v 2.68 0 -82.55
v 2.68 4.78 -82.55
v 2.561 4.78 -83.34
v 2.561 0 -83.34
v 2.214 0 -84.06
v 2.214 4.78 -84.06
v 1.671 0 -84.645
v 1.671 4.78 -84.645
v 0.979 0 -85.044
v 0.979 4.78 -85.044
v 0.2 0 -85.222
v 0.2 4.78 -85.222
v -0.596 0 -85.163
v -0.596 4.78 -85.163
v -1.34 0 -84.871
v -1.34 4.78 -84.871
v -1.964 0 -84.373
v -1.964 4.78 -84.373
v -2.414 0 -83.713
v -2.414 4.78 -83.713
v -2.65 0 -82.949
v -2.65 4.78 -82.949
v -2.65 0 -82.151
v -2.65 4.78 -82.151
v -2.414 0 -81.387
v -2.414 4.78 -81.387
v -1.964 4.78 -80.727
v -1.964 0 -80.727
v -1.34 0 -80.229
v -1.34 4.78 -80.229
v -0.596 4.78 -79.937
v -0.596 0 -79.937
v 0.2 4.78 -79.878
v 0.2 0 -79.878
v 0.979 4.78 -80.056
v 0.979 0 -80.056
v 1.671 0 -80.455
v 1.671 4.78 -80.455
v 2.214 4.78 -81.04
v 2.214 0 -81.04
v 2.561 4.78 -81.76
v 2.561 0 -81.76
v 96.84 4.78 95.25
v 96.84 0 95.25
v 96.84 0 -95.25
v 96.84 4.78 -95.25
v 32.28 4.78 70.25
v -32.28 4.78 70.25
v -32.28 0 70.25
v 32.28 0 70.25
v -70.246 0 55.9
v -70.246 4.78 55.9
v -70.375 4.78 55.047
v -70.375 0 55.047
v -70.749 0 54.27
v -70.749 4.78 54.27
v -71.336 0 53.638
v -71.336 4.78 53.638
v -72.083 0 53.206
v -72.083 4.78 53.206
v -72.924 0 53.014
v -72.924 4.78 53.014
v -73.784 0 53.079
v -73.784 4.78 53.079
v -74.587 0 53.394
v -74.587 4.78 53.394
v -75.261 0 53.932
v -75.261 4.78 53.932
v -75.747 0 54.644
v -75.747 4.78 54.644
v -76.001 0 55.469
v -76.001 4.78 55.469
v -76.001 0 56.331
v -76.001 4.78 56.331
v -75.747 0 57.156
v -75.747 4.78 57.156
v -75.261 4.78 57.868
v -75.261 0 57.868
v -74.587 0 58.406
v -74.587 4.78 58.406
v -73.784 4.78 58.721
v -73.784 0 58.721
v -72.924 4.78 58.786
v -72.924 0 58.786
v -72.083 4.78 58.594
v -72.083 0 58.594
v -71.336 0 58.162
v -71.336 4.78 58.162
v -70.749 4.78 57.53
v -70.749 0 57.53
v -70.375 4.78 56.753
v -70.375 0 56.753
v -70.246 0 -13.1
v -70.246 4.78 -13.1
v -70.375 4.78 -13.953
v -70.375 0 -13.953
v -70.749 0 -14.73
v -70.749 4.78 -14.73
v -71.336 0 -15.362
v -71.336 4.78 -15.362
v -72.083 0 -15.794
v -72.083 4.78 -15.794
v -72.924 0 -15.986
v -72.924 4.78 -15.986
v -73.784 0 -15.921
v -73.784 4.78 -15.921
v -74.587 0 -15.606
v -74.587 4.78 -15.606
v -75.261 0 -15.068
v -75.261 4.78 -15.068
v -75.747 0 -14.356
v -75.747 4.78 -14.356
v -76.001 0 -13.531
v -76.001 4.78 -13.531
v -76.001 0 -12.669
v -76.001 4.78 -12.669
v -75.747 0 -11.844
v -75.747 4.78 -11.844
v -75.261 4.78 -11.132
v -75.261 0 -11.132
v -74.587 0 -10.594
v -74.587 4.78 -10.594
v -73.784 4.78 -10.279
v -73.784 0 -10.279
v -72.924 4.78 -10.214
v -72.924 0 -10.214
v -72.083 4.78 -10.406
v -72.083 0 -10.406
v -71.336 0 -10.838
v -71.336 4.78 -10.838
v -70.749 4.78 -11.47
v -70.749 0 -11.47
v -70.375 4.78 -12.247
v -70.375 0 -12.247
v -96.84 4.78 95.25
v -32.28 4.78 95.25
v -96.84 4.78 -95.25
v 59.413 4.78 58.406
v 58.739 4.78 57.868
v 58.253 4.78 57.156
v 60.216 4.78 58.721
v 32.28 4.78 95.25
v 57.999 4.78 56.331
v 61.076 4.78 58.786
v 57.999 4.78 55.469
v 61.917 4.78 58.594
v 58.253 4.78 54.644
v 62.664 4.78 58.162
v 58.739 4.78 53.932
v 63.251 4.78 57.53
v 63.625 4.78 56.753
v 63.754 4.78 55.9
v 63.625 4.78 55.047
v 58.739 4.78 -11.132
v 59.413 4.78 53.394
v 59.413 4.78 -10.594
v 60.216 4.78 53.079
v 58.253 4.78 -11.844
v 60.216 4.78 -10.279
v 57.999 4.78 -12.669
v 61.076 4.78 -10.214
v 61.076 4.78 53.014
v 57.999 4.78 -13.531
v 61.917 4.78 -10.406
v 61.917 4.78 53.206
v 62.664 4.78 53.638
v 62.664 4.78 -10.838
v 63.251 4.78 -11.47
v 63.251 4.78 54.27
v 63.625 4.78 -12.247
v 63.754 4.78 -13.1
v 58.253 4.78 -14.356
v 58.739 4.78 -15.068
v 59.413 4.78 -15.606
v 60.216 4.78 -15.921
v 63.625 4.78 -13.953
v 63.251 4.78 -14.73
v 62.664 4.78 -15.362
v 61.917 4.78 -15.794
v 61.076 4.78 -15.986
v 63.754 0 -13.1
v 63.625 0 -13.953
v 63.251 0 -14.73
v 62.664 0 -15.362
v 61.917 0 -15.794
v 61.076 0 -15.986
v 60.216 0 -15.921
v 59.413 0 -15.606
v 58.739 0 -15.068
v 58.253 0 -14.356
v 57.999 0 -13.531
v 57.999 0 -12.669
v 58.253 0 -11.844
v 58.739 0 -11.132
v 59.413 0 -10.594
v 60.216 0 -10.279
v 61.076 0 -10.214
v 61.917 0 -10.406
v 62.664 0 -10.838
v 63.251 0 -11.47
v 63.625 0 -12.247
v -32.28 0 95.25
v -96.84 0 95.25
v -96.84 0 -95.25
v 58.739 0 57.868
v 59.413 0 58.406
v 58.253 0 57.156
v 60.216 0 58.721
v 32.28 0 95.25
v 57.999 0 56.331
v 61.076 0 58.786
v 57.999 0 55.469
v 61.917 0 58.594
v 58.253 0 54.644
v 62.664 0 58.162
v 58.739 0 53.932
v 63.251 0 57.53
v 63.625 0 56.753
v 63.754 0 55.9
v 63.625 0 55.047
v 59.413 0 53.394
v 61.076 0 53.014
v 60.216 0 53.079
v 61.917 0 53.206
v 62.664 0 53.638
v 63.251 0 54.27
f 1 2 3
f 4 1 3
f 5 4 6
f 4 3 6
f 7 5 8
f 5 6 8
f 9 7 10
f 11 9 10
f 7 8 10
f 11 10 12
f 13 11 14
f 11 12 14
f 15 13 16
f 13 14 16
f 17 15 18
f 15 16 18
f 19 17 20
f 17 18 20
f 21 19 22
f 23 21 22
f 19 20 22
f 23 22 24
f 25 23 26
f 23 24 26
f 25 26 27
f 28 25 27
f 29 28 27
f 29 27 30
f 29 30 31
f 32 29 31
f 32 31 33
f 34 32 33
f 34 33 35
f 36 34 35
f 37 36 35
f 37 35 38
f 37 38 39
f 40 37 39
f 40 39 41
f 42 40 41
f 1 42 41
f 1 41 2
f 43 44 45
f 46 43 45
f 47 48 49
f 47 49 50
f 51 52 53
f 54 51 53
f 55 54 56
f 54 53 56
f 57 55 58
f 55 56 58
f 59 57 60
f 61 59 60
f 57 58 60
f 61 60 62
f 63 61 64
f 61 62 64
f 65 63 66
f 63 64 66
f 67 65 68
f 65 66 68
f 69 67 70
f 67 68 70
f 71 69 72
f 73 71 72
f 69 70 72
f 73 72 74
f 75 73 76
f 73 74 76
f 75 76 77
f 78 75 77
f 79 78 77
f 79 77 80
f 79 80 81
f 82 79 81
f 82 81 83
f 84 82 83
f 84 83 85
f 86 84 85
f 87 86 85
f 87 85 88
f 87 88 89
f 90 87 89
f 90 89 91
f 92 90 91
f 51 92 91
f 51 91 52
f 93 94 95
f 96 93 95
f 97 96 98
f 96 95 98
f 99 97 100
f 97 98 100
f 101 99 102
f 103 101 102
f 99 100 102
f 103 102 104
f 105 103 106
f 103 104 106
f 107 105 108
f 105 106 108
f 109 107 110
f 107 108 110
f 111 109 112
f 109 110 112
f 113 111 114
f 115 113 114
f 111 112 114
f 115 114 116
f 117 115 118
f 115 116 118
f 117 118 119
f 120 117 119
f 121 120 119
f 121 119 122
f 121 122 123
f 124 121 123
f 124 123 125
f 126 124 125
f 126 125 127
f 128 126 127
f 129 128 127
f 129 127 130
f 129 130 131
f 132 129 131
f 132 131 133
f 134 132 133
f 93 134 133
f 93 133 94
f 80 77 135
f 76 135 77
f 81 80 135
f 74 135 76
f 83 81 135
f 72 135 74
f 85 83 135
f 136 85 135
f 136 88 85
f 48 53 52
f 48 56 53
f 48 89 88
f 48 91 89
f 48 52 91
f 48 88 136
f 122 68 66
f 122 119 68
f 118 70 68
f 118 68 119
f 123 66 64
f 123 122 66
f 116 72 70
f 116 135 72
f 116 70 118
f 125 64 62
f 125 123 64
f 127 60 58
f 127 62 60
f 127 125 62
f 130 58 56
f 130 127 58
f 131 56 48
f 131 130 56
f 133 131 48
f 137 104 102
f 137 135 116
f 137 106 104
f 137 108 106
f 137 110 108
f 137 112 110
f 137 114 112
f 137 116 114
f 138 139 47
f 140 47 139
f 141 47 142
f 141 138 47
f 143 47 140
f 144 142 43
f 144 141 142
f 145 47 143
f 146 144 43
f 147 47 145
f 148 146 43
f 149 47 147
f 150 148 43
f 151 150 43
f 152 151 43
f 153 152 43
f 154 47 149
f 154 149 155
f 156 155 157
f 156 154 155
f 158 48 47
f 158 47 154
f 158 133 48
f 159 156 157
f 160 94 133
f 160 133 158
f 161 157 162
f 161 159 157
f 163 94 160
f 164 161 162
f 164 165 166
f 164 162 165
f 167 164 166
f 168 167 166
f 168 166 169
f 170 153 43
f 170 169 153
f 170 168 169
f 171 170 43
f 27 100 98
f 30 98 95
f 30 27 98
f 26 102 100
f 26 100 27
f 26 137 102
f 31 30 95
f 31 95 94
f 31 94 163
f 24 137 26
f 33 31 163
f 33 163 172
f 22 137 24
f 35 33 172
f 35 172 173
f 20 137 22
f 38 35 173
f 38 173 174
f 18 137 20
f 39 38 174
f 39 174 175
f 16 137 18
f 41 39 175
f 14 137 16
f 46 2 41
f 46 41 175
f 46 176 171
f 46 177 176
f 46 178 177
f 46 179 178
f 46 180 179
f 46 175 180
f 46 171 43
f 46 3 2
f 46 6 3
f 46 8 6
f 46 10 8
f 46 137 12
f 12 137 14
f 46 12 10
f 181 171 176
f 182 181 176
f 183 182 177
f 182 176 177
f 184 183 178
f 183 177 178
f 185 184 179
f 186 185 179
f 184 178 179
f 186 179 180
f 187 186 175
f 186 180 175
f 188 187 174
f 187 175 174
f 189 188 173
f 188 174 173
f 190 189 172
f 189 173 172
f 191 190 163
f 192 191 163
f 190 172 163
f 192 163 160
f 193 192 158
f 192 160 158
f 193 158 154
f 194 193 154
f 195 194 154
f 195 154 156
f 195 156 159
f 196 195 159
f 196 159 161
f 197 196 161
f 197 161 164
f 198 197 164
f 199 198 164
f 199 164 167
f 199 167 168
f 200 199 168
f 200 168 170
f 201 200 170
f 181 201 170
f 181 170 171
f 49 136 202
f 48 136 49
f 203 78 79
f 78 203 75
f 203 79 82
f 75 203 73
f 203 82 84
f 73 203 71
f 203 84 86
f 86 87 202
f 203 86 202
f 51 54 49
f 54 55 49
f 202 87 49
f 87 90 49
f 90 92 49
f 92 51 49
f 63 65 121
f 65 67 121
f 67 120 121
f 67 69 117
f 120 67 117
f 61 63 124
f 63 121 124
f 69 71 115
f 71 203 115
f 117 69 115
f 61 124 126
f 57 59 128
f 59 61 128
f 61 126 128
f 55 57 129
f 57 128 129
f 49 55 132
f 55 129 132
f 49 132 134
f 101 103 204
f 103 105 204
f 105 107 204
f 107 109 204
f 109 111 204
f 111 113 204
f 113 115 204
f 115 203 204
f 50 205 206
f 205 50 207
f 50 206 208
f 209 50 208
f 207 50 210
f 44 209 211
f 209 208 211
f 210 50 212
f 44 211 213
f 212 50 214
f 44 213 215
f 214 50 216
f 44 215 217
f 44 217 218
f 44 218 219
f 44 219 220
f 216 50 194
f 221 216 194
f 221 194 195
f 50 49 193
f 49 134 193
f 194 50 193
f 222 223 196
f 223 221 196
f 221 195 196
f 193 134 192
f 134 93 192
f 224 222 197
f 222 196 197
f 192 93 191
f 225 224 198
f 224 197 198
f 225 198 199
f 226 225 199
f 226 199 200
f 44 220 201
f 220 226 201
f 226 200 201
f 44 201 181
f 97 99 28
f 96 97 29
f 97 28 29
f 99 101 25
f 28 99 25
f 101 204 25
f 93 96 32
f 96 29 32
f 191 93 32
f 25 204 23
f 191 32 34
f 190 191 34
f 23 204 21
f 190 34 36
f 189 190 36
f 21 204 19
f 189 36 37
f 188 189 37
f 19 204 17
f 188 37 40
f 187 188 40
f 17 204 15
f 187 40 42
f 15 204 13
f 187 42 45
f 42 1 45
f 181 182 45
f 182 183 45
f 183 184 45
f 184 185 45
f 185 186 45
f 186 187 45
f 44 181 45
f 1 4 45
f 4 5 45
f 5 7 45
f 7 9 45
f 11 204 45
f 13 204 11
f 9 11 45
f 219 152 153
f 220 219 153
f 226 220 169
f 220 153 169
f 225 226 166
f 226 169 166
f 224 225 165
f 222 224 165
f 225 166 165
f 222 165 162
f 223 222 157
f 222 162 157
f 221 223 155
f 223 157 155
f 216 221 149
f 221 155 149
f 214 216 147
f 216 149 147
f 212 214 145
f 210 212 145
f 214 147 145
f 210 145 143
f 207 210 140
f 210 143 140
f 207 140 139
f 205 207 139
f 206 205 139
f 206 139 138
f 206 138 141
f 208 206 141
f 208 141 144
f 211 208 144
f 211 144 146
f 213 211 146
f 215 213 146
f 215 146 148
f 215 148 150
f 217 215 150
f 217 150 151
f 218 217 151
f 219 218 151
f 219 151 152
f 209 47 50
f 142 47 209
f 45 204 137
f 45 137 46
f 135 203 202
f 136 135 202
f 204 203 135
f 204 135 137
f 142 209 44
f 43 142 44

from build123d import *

# Parameters (mm, degrees)
SKETCH1_W           = 193.68
SKETCH1_H           = 190.5
BOSS_EXTRUDE1_DEPTH = 4.78
SKETCH2_R           = 2.6797
CUT_EXTRUDE1_DEPTH  = 5.78
CUT_EXTRUDE2_DEPTH  = 5.78
SKETCH4_R           = 2.893699953
CUT_EXTRUDE3_DEPTH  = 5.78


with BuildPart() as part:
    # Sketch1 → Boss-Extrude1 (new body)
    with BuildSketch(Plane(origin=(0, 0, 0), x_dir=(1, 0, 0), z_dir=(0, 1, 0))):
        Rectangle(SKETCH1_W, SKETCH1_H)
    extrude(amount=BOSS_EXTRUDE1_DEPTH)

    # Sketch2 → Cut-Extrude1 (cut, through all)
    with BuildSketch(Plane(origin=(0, 4.78, 0), x_dir=(1, 0, 0), z_dir=(0, 1, 0))):
        with Locations((0, 82.55)):
            Circle(SKETCH2_R)
    extrude(amount=-CUT_EXTRUDE1_DEPTH, mode=Mode.SUBTRACT)

    # Sketch3 → Cut-Extrude2 (cut, through all)
    with BuildSketch(Plane(origin=(0, 4.78, 0), x_dir=(1, 0, 0), z_dir=(0, 1, 0))):
        Polygon((0, -95.25), (-32.28, -95.25), (-32.28, -70.249999962), (32.28, -70.249999962), (32.28, -95.25), align=None)
    extrude(amount=-CUT_EXTRUDE2_DEPTH, mode=Mode.SUBTRACT)

    # Sketch4 → Cut-Extrude3 (cut, through all)
    with BuildSketch(Plane(origin=(0, 4.78, 0), x_dir=(1, 0, 0), z_dir=(0, 1, 0))):
        with Locations((-73.14, -55.899999962)):
            Circle(SKETCH4_R)
        with Locations((-73.14, 13.100000038)):
            Circle(SKETCH4_R)
        with Locations((60.86, 13.100000038)):
            Circle(SKETCH4_R)
        with Locations((60.86, -55.899999962)):
            Circle(SKETCH4_R)
    extrude(amount=-CUT_EXTRUDE3_DEPTH, mode=Mode.SUBTRACT)


solid = part.part
